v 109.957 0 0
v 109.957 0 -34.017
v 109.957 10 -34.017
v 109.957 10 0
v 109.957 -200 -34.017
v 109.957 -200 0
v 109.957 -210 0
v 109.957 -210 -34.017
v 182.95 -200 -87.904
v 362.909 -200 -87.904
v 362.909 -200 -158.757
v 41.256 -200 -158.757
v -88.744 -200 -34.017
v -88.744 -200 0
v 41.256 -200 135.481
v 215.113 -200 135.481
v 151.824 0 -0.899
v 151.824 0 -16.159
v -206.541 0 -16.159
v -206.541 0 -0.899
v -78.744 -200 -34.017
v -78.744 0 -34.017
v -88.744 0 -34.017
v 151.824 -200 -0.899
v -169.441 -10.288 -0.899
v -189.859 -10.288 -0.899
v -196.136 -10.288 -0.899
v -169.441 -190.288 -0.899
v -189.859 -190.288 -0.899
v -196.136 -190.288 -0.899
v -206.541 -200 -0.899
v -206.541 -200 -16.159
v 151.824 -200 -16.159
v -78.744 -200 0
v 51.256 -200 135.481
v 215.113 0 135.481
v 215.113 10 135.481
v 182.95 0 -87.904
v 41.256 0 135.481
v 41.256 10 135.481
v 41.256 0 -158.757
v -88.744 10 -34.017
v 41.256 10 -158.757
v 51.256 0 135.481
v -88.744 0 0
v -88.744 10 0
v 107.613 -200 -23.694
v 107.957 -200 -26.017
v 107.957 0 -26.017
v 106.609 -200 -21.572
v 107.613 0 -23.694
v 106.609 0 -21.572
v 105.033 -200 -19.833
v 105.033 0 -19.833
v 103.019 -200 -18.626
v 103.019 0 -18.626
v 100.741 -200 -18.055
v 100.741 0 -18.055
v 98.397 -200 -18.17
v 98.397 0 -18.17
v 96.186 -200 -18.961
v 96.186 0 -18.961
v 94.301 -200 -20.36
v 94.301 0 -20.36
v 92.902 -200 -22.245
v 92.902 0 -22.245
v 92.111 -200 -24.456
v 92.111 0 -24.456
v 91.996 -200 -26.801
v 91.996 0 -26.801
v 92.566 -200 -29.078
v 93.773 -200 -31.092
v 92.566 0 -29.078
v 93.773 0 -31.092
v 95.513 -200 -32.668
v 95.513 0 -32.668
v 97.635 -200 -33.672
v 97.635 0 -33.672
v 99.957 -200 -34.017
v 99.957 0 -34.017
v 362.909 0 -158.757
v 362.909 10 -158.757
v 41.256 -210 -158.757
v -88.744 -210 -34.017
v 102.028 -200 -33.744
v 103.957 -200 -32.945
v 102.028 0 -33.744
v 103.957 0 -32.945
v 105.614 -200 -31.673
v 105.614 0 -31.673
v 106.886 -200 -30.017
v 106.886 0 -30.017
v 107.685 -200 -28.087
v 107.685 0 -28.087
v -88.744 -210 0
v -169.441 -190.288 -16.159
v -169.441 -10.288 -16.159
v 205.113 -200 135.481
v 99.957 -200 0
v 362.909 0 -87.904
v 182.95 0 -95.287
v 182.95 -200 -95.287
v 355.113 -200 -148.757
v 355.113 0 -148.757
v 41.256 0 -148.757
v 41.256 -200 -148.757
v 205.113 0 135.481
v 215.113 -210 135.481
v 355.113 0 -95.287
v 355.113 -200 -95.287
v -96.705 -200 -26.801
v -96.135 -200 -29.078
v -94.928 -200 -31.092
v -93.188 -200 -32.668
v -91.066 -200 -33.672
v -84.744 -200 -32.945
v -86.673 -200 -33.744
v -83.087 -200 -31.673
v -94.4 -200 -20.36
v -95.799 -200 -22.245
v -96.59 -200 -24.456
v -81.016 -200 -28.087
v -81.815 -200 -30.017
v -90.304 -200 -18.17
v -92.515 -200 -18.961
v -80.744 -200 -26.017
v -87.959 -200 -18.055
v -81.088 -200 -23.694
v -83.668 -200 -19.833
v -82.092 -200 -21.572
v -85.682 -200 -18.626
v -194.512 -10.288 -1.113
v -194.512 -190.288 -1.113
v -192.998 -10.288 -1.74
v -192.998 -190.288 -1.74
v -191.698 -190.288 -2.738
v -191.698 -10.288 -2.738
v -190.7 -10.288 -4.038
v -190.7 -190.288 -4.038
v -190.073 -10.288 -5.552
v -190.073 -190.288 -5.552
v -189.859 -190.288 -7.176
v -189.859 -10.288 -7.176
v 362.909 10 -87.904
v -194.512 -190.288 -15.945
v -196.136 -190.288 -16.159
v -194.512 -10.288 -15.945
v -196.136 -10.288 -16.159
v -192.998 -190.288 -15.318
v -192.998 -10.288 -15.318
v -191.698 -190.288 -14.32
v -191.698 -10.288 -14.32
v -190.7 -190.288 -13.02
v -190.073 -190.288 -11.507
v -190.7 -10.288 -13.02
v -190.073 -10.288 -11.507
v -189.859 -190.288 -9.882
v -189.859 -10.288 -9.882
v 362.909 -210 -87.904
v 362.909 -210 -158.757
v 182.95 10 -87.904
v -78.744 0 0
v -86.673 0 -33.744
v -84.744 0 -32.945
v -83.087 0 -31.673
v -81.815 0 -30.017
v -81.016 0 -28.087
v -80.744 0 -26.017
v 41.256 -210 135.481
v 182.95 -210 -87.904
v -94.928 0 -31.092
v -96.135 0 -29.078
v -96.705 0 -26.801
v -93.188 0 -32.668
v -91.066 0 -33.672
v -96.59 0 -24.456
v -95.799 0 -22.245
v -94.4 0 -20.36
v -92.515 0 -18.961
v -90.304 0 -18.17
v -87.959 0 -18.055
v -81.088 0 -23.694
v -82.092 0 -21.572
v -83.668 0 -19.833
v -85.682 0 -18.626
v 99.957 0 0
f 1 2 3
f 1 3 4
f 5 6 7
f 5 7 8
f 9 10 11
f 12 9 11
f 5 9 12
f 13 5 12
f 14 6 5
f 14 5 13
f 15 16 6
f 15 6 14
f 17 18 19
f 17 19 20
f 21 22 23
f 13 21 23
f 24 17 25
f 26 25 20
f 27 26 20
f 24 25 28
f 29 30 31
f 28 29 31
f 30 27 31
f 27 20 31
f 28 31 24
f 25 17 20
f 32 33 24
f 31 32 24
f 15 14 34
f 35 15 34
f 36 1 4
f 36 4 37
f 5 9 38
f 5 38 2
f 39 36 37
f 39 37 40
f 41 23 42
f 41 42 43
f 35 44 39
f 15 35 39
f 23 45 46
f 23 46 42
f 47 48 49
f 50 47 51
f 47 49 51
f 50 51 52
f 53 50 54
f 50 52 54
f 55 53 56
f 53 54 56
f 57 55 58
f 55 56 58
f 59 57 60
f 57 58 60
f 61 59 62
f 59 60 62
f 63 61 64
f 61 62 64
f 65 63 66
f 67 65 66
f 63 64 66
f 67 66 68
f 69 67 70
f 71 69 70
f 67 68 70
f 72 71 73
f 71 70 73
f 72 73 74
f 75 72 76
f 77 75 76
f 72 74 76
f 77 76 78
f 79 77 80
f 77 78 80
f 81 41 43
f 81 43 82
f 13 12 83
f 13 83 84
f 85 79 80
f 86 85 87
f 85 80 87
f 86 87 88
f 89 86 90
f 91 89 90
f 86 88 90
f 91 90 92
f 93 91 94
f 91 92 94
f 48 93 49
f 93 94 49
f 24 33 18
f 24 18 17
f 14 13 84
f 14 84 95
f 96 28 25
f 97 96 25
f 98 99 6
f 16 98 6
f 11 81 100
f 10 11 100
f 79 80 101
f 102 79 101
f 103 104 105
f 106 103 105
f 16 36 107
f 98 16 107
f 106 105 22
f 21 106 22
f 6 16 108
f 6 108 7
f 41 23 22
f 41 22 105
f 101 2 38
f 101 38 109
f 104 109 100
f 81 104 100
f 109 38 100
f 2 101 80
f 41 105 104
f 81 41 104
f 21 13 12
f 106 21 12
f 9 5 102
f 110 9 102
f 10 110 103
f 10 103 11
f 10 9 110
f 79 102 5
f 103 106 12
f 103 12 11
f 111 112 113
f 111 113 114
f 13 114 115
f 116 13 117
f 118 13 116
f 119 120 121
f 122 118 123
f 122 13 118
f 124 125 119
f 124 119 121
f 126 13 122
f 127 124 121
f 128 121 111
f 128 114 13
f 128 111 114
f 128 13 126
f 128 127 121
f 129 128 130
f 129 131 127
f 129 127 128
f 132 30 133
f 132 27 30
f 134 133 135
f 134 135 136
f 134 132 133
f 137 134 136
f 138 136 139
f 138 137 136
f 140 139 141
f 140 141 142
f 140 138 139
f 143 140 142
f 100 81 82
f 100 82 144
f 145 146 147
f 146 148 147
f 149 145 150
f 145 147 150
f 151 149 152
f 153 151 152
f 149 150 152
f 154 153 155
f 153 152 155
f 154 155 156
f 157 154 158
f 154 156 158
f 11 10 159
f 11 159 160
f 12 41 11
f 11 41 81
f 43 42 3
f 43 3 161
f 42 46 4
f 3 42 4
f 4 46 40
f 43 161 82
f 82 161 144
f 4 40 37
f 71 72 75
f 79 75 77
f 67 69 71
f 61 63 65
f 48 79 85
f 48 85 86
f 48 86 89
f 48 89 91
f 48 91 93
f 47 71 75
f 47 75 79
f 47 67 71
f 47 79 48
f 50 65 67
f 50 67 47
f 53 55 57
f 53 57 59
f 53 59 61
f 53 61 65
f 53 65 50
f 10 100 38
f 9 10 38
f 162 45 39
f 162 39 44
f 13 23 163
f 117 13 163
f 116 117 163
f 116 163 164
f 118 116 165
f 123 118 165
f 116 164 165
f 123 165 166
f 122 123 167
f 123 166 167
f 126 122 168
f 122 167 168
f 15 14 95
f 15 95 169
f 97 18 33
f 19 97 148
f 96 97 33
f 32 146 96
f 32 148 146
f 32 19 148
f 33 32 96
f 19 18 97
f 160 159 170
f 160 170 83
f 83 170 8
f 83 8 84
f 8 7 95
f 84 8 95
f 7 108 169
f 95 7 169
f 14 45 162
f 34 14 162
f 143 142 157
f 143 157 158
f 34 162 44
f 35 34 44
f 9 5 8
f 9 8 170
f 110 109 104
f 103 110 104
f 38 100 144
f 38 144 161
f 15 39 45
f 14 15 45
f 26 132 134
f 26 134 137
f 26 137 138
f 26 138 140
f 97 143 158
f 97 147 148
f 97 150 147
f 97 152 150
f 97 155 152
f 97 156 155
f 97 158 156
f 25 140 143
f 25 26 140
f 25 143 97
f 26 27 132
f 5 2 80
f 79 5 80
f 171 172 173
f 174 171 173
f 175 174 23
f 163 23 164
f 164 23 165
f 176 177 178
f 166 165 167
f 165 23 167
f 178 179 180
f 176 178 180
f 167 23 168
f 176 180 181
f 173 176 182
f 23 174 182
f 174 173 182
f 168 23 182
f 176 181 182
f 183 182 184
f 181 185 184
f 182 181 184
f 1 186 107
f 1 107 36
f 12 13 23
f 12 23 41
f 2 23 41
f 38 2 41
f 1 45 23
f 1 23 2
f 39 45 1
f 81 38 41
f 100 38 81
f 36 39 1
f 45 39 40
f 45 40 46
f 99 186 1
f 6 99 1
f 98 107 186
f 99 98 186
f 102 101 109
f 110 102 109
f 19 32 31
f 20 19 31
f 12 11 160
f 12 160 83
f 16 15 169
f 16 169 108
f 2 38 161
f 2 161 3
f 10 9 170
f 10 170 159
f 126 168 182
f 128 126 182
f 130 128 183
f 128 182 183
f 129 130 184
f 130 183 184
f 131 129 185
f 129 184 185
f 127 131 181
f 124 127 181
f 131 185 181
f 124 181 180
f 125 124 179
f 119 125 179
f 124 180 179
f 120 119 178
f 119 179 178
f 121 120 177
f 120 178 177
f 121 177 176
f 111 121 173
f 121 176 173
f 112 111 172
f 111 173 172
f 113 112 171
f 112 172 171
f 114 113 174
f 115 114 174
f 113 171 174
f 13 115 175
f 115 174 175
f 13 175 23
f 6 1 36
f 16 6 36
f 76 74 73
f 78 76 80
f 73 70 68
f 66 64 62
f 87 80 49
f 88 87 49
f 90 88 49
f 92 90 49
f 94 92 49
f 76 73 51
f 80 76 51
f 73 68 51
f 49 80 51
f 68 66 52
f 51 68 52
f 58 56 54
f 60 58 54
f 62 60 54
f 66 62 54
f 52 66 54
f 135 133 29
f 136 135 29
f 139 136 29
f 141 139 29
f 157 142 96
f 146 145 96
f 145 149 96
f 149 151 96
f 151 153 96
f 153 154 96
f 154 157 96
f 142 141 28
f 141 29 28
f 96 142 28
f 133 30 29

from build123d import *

# Parameters (mm, degrees)
F1_DEPTH  = 200
F0_W      = 333.365008235
F0_H      = 15.2596643893
F2_W      = 20.4179258991
F2_H      = 180
F3_DEPTH  = 25
F4_R      = 6.2769552622
F7_DEPTH  = 10
F8_DEPTH  = 25
F11_DEPTH = 10


with BuildPart() as f1:
    # F0 (on Front) → F1 (new body)
    with BuildSketch(Plane.XZ):
        Polygon((41.2563910439, 135.4811938527), (-88.7435870727, 0), (-78.7435870727, 0), (51.2563910439, 135.4811938527), align=None)
    extrude(amount=F1_DEPTH)


with BuildPart() as f1b:
    # F0 (on Front) → F1, piece 2 (new body)
    with BuildSketch(Plane.XZ):
        Polygon((205.112572035, 135.4811938527), (99.9573543668, 0), (109.9573543668, 0), (215.112572035, 135.4811938527), align=None)
    extrude(amount=F1_DEPTH)


with BuildPart() as f1c:
    # F0 (on Front) → F1, piece 3 (new body)
    with BuildSketch(Plane.XZ):
        with BuildLine():
            ThreePointArc((-88.7435870727, -34.0165881674), (-83.0867328232, -31.6734424169), (-80.7435870727, -26.0165881674))
            ThreePointArc((-80.7435870727, -26.0165881674), (-94.4004413222, -20.3597339179), (-88.7435870727, -34.0165881674))
        make_face()
    extrude(amount=F1_DEPTH)


with BuildPart() as f1d:
    # F0 (on Front) → F1, piece 4 (new body)
    with BuildSketch(Plane.XZ):
        with BuildLine():
            ThreePointArc((107.9573543668, -26.0165881674), (94.3005001173, -20.3597339179), (99.9573543668, -34.0165881674))
            ThreePointArc((99.9573543668, -34.0165881674), (105.6142086163, -31.6734424169), (107.9573543668, -26.0165881674))
        make_face()
    extrude(amount=F1_DEPTH)


with BuildPart() as f1e:
    # F0 (on Front) → F1, piece 5 (new body)
    with BuildSketch(Plane.XZ):
        Polygon((-78.7435870727, -34.0165881674), (-88.7435870727, -34.0165881674), (41.2563910439, -158.7571062403), (362.9086315632, -158.7571062403), (362.9086315632, -87.9040136933), (182.9500347376, -87.9040136933), (109.9573543668, -34.0165881674), (99.9573543668, -34.0165881674), (182.9500347376, -95.2865930495), (355.1130890846, -95.2865930495), (355.1130890846, -148.7571062403), (41.2563910439, -148.7571062403), align=None)
    extrude(amount=F1_DEPTH)


with BuildPart() as f1f:
    # F0 (on Front) → F1, piece 6 (new body)
    with BuildSketch(Plane.XZ):
        with Locations((-39.8583337665, -8.5290987627)):
            Rectangle(F0_W, F0_H)
    extrude(amount=F1_DEPTH)

    # F2 (on face) → F3 (cut)
    with BuildSketch(Plane.XY.offset(-0.899266568)):
        with Locations((-179.6501800418, -100.2876753919)):
            Rectangle(F2_W, F2_H)
    extrude(amount=-F3_DEPTH, mode=Mode.SUBTRACT)

    # F4
    f4_edges = [f1f.edges().sort_by_distance(p)[0] for p in [
        (-189.859143, -100.287675, -0.899267),
        (-189.859143, -100.287675, -16.158931),
    ]]
    fillet(f4_edges, radius=F4_R)

    # F8 (add): a face of the model
    f8_faces = [f1f.faces().sort_by_distance(p)[0] for p in [
        (126.824170351, -100, -8.5290987627),
    ]]
    extrude(f8_faces, amount=F8_DEPTH)


with BuildPart() as f7:
    # F6 (on 3pt) → F7 (new body)
    with BuildSketch(Plane(origin=(0, -200, 0), x_dir=(-1, 0, 0), z_dir=(0, 1, 0))):
        Polygon((-41.2563910439, -158.7571062403), (88.7435870727, -34.0165881674), (88.7435870727, 0), (-41.2563910439, 135.4811938527), (-51.2563910439, 135.4811938527), (-205.112572035, 135.4811938527), (-215.112572035, 135.4811938527), (-109.9573543668, 0), (-109.9573543668, -34.0165881674), (-182.9500347376, -87.9040136933), (-362.9086315632, -87.9040136933), (-362.9086315632, -158.7571062403), align=None)
    extrude(amount=-F7_DEPTH)


with BuildPart() as f11:
    # F10 (on 3pt) → F11 (new body)
    with BuildSketch(Plane.XZ):
        Polygon((362.9086315632, -158.7571062403), (362.9086315632, -87.9040136933), (182.9500347376, -87.9040136933), (109.9573543668, -34.0165881674), (109.9573543668, 0), (215.112572035, 135.4811938527), (41.2563910439, 135.4811938527), (-88.7435870727, 0), (-88.7435870727, -34.0165881674), (41.2563910439, -158.7571062403), align=None)
    extrude(amount=-F11_DEPTH)


solid = Compound([f1.part, f1b.part, f1c.part, f1d.part, f1e.part, f1f.part, f7.part, f11.part])
